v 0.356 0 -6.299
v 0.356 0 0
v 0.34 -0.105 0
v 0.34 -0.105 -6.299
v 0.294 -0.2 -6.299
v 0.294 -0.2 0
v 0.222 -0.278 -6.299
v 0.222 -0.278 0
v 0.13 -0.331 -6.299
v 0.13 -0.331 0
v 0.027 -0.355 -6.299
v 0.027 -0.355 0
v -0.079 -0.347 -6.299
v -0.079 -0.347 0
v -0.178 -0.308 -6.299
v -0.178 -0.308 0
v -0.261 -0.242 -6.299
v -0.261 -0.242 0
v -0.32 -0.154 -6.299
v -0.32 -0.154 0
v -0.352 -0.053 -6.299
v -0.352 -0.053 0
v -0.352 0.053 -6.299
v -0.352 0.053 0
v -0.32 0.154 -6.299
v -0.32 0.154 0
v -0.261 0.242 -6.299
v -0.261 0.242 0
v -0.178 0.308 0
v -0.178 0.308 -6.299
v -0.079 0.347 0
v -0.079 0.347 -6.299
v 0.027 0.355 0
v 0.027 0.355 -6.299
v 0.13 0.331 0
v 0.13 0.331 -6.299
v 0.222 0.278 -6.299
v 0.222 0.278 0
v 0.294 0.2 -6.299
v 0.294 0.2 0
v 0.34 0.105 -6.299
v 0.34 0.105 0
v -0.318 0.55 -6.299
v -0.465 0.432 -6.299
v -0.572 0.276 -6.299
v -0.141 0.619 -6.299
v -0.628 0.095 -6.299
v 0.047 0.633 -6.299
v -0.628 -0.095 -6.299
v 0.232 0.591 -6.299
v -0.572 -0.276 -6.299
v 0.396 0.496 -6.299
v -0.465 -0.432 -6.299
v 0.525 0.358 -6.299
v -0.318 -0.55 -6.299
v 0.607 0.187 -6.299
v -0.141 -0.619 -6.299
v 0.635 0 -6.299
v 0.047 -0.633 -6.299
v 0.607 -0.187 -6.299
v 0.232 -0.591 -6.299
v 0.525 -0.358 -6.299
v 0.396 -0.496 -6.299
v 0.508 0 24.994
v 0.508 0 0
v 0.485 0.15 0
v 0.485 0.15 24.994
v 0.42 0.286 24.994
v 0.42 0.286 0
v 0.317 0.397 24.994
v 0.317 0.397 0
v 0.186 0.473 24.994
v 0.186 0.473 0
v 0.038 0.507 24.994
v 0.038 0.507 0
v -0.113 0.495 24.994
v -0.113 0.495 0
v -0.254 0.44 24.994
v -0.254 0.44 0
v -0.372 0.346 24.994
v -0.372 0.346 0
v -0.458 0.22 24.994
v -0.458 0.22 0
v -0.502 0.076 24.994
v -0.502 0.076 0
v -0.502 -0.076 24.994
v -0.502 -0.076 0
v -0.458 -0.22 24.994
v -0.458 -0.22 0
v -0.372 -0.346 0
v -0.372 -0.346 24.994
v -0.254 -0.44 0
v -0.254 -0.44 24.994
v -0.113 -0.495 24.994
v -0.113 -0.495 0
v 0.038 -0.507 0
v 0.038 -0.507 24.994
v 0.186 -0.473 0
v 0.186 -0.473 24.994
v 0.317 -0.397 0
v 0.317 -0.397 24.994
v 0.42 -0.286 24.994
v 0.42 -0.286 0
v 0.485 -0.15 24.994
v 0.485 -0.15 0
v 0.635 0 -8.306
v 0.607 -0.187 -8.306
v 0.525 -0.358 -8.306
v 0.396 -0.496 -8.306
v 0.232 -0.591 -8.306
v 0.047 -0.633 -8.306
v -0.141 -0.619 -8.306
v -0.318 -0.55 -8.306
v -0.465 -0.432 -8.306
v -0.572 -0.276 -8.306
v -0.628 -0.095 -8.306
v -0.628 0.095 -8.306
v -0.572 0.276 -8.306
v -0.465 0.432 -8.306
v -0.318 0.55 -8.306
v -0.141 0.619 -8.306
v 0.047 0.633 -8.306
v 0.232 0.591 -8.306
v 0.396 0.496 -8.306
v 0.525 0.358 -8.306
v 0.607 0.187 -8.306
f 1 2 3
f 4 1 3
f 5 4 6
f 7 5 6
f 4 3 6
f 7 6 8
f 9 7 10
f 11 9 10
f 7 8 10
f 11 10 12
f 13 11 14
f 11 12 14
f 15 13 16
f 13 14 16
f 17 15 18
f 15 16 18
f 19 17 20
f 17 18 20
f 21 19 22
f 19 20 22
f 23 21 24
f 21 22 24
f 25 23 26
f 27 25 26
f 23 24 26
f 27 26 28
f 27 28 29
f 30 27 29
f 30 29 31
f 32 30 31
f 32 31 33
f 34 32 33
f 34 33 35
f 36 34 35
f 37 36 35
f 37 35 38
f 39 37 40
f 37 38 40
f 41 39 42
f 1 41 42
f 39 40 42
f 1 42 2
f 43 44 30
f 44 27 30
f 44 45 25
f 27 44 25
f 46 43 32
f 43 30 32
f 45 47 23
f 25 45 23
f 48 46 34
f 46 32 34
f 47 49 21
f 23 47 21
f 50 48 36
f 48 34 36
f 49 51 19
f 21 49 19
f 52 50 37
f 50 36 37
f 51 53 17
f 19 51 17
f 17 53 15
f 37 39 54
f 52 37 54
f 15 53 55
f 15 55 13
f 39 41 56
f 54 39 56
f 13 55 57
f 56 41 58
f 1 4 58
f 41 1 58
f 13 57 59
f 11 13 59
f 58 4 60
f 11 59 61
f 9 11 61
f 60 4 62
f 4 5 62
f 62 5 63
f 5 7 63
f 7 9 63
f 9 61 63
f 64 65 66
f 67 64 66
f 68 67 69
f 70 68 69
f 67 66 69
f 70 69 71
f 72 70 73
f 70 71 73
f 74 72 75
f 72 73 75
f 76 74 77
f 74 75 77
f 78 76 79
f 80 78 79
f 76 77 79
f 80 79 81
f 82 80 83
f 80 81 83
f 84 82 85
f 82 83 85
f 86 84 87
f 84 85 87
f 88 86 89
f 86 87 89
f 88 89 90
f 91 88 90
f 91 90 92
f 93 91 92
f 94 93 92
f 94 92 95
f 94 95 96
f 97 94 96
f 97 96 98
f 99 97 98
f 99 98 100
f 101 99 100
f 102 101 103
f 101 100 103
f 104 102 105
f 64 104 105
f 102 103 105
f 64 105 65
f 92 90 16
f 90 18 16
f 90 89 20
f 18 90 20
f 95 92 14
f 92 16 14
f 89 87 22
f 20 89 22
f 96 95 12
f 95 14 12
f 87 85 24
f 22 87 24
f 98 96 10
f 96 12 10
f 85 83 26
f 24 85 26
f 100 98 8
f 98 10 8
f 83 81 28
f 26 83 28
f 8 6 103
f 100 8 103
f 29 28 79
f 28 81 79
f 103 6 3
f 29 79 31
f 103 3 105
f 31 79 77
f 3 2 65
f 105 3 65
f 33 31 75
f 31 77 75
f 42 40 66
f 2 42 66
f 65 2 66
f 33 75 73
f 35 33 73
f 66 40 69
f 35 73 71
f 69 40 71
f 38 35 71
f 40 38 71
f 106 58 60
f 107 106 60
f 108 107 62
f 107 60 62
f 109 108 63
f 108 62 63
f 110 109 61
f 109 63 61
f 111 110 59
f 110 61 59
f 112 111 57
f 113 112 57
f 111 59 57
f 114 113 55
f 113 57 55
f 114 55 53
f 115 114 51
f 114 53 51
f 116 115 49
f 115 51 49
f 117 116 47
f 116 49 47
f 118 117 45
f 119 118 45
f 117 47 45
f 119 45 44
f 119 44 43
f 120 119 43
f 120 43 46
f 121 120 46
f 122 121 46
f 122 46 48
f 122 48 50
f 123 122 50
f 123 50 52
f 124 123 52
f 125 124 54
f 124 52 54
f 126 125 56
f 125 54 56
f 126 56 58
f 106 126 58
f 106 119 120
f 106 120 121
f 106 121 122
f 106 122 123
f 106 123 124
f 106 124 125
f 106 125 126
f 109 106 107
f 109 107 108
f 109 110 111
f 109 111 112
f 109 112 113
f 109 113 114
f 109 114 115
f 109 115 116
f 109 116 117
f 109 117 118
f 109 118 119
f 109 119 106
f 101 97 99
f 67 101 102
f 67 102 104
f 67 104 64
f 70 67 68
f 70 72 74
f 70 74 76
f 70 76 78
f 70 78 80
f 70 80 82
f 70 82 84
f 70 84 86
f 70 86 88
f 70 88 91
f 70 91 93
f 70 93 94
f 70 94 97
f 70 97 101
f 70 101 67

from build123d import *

# Parameters (mm, degrees)
F0_R     = 0.508
F1_DEPTH = 24.9936
F2_R     = 0.3556
F3_DEPTH = 6.2992
F4_R     = 0.635
F5_DEPTH = 2.0066


with BuildPart() as f1:
    # F0 (on Top) → F1 (new body)
    with BuildSketch(Plane.XY):
        Circle(F0_R)
    extrude(amount=F1_DEPTH)

    # F2 (on face) → F3 (join)
    with BuildSketch(Plane(origin=(0, 0, 0), x_dir=(1, 0, 0), z_dir=(0, 0, -1))):
        Circle(F2_R)
    extrude(amount=F3_DEPTH)

    # F4 (on face) → F5 (join)
    with BuildSketch(Plane(origin=(0, 0, -6.2992), x_dir=(1, 0, 0), z_dir=(0, 0, -1))):
        Circle(F4_R)
    extrude(amount=F5_DEPTH)


solid = f1.part
